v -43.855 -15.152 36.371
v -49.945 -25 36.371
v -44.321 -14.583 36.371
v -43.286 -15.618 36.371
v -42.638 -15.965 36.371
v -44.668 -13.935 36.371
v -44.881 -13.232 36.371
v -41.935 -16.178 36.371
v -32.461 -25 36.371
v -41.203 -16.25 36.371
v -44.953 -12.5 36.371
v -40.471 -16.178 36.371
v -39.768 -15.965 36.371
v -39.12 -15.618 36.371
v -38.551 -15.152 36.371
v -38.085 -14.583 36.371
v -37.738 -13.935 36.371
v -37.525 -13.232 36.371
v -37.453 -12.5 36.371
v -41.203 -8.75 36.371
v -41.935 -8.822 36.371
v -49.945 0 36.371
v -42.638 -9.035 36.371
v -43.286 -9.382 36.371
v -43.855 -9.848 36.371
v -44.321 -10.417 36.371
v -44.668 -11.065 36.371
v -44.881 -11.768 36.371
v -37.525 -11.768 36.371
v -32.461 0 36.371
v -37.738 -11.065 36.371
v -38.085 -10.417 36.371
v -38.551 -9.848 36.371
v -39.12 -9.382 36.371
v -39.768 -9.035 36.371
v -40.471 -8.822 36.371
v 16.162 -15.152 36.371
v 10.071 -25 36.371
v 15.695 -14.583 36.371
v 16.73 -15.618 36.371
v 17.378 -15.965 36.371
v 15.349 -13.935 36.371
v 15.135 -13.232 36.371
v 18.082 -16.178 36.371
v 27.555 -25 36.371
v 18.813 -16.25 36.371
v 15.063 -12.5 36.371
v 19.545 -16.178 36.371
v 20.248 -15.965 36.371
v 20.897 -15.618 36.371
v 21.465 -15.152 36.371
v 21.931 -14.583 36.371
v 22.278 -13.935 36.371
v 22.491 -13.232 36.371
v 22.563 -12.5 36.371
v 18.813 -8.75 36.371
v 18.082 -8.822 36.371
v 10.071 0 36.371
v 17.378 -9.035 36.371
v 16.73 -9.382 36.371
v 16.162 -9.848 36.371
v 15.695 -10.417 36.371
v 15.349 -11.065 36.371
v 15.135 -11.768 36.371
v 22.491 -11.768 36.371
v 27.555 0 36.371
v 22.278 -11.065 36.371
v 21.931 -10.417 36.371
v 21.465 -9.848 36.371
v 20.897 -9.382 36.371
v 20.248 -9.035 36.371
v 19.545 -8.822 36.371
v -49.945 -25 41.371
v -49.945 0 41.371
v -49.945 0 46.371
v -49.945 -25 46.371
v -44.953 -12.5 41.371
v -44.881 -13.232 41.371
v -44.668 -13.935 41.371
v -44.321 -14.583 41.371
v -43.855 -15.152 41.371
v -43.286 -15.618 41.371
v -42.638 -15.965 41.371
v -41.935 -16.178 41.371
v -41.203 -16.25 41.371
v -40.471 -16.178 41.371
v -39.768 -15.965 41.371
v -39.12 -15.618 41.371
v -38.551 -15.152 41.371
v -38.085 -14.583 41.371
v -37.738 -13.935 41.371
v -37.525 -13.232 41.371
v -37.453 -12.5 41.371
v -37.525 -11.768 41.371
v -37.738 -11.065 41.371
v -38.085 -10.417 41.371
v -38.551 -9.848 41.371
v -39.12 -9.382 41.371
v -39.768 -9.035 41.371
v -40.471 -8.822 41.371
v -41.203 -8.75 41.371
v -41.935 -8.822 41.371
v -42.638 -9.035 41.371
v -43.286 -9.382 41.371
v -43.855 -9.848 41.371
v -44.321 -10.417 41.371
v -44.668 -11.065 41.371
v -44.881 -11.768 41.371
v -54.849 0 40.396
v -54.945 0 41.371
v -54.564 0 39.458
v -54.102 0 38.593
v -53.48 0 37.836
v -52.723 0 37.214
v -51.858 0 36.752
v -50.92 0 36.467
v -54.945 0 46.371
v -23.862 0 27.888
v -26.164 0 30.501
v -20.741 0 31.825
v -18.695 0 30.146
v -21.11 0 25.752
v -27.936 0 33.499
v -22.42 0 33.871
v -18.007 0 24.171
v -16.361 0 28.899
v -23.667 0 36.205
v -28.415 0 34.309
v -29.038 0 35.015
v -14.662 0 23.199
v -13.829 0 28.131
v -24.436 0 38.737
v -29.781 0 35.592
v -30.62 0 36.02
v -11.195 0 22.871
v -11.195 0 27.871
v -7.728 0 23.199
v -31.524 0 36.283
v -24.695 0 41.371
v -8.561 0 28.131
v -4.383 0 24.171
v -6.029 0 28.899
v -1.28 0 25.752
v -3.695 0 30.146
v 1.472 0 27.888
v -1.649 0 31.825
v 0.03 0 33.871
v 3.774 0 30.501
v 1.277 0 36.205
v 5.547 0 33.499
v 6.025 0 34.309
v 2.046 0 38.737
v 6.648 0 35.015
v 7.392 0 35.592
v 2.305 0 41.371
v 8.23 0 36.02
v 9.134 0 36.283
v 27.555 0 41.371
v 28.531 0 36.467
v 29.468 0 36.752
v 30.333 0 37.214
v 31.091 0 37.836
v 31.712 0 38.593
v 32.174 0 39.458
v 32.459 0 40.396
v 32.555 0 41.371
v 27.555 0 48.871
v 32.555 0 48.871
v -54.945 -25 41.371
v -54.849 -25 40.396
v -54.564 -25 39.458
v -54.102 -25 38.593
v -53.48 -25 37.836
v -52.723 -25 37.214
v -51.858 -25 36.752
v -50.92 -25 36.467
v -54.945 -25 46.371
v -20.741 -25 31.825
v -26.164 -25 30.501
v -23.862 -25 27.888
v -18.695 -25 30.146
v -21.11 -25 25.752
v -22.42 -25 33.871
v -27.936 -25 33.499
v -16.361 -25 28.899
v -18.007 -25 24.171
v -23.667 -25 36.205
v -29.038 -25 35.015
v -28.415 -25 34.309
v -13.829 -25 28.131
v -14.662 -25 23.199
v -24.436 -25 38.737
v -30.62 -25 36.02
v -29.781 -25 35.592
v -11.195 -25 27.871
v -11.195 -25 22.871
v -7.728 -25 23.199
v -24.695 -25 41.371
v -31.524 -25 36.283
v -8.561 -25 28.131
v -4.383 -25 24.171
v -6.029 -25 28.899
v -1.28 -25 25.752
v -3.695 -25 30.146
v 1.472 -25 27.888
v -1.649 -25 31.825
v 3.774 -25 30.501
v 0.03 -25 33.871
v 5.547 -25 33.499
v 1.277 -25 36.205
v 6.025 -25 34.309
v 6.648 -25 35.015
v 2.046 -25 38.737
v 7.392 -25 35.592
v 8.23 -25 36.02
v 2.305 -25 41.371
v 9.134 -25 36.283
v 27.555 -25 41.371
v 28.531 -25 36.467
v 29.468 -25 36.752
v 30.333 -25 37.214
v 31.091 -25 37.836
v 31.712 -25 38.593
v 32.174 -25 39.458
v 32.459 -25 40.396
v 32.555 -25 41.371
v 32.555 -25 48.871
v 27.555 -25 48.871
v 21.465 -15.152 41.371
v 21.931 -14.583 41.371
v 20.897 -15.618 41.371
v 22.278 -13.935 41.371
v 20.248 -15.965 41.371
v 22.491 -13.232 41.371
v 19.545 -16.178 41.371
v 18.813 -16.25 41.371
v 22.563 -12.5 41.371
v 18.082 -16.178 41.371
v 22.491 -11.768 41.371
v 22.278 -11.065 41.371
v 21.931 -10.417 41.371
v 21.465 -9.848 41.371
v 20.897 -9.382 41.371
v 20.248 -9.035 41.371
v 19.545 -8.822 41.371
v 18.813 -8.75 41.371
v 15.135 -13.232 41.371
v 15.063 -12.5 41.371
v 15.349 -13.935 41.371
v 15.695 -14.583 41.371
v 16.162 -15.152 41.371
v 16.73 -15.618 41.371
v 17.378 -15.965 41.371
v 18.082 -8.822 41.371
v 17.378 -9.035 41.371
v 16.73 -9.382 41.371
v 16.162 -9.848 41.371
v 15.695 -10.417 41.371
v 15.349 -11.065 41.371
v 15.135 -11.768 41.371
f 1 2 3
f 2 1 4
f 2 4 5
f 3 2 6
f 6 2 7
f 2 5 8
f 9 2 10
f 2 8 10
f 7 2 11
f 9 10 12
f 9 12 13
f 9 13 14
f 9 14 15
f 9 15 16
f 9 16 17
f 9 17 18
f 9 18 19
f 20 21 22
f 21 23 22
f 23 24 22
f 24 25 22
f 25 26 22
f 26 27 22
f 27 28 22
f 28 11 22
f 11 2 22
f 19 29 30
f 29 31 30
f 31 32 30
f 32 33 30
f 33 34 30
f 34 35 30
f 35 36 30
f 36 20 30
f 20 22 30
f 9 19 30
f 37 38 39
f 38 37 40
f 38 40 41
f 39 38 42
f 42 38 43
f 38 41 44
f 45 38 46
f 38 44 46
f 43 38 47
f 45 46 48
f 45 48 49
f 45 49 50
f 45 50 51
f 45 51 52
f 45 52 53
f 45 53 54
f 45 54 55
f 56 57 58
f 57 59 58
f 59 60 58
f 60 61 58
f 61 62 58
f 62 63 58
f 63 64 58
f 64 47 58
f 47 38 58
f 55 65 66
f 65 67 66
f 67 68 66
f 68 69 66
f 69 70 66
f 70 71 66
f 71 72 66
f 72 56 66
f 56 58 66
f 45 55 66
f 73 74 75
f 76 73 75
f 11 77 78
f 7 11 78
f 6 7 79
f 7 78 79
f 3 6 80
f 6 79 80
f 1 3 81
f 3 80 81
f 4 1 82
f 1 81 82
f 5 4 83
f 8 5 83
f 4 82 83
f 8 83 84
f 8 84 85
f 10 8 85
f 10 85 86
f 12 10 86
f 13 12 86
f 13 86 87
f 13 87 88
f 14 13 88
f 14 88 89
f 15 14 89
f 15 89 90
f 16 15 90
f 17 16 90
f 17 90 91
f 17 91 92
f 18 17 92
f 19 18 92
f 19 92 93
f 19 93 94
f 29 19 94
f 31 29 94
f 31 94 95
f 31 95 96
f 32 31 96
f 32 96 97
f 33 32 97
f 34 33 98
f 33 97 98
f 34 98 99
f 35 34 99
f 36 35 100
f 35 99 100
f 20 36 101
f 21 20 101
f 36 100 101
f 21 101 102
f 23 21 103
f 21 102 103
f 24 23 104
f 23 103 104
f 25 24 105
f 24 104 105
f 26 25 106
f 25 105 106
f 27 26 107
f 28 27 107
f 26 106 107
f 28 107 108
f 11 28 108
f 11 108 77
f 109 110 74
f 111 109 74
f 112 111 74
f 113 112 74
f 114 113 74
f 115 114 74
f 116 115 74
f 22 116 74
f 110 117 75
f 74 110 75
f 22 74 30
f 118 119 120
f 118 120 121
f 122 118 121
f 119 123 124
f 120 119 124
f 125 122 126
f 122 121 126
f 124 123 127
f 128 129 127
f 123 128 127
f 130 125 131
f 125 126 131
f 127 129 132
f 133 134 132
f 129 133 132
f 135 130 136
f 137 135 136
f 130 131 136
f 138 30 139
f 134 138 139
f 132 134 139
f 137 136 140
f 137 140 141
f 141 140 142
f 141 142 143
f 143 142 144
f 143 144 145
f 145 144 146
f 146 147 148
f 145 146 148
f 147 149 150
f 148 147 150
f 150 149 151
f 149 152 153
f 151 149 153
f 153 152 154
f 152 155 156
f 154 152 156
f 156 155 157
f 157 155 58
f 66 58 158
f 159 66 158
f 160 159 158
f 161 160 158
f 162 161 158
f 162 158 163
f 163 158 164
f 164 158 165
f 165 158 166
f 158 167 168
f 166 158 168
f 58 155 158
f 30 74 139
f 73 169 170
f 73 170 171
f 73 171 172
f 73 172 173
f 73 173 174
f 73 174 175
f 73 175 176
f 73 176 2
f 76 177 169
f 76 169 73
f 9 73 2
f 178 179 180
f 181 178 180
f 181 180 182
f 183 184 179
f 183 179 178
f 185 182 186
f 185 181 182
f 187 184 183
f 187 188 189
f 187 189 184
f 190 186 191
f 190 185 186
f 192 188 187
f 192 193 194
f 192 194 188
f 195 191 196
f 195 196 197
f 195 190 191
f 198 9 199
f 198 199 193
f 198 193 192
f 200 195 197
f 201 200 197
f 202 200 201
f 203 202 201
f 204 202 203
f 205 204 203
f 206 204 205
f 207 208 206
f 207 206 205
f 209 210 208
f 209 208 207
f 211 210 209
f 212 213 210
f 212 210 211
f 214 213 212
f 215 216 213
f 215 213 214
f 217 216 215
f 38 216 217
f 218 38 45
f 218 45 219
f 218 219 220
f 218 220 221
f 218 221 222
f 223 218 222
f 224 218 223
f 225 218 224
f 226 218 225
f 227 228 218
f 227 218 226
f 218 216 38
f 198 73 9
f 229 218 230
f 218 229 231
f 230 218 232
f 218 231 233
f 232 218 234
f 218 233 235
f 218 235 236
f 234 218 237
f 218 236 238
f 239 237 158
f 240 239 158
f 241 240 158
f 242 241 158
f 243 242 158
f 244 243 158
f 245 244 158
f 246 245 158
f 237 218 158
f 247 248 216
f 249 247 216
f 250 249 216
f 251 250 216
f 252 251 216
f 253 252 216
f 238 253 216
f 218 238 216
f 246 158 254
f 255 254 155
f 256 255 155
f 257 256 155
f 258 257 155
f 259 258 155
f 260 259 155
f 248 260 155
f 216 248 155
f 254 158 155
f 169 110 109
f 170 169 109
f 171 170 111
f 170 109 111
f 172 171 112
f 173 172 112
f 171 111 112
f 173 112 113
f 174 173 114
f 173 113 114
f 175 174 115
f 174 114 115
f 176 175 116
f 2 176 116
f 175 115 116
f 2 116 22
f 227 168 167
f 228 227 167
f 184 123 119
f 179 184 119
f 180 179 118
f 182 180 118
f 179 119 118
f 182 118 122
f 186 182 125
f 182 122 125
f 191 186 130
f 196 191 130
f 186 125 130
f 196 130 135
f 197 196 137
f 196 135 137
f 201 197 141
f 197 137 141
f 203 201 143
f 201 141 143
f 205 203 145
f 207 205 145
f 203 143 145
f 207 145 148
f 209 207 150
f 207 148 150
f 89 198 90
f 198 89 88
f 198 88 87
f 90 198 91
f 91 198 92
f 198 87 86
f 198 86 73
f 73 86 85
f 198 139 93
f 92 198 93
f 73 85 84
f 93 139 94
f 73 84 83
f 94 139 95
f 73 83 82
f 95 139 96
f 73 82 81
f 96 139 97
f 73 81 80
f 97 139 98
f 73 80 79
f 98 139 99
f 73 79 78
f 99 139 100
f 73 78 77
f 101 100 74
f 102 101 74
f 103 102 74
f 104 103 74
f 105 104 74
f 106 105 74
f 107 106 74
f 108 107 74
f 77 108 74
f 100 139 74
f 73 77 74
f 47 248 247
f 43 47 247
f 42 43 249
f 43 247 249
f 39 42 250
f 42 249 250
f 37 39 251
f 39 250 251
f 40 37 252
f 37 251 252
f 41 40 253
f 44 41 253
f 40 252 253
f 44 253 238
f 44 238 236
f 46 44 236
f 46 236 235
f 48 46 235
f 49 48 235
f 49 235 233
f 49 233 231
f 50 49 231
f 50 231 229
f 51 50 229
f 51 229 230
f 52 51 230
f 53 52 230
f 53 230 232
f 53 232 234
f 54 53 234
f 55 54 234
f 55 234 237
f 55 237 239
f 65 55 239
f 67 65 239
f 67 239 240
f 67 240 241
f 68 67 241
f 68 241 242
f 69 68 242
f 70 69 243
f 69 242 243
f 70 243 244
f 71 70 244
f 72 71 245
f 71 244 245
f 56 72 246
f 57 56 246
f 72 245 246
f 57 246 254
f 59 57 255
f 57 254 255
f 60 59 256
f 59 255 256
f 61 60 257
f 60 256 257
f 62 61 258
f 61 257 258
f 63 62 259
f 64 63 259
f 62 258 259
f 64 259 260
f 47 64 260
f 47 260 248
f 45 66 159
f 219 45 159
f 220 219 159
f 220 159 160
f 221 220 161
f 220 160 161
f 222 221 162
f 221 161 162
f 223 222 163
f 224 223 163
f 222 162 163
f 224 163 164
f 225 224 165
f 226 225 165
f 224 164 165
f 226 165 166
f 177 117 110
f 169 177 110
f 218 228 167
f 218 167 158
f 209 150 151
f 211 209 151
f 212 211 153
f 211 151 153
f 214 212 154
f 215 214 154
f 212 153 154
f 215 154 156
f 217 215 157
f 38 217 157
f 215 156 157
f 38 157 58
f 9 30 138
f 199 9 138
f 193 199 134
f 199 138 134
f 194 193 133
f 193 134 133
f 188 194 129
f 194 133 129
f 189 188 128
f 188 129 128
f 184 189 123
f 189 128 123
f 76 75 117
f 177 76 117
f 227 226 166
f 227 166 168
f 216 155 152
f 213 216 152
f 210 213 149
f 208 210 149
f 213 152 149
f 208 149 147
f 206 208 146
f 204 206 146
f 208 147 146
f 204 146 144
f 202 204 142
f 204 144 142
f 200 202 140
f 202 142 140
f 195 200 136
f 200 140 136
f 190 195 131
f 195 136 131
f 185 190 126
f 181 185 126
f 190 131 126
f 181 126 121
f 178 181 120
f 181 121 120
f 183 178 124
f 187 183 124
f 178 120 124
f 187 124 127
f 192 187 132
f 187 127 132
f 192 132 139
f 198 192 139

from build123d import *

# Parameters (mm, degrees)
F1_DEPTH = 25
F3_D     = 7.5
F4_D     = 7.5


with BuildPart() as f1:
    # F0 (on Front) → F1 (new body)
    with BuildSketch(Plane.XZ):
        with BuildLine():
            Line((-49.944923, 46.371131), (-54.944923, 46.371131))
            Line((-54.944923, 46.371131), (-54.944923, 41.371131))
            ThreePointArc((-54.944923, 41.371131), (-53.480457, 37.835597), (-49.944923, 36.371131))
            Line((-49.944923, 36.371131), (-32.461094, 36.371131))
            ThreePointArc((-32.461094, 36.371131), (-29.781383, 35.592405), (-27.936377, 33.498791))
            ThreePointArc((-27.936377, 33.498791), (-11.194923, 22.871131), (5.54653, 33.498791))
            ThreePointArc((5.54653, 33.498791), (7.391536, 35.592405), (10.071247, 36.371131))
            Line((10.071247, 36.371131), (27.555077, 36.371131))
            ThreePointArc((27.555077, 36.371131), (31.09061, 37.835597), (32.555077, 41.371131))
            Line((32.555077, 41.371131), (32.555077, 48.871131))
            Line((32.555077, 48.871131), (27.555077, 48.871131))
            Line((27.555077, 48.871131), (27.555077, 41.371131))
            Line((27.555077, 41.371131), (2.305077, 41.371131))
            ThreePointArc((2.305077, 41.371131), (-11.194923, 27.871131), (-24.694923, 41.371131))
            Line((-24.694923, 41.371131), (-49.944923, 41.371131))
            Line((-49.944923, 41.371131), (-49.944923, 46.371131))
        make_face()
    extrude(amount=F1_DEPTH)

    # F3 (through all)
    with Locations(Plane(origin=(0, 0, 36.371131), x_dir=(1, 0, 0), z_dir=(0, 0, -1))):
        with Locations((-41.203009, 12.5)):
            Hole(F3_D / 2)

    # F4 (through all)
    with Locations(Plane(origin=(0, 0, 36.371131), x_dir=(1, 0, 0), z_dir=(0, 0, -1))):
        with Locations((18.813162, 12.5)):
            Hole(F4_D / 2)


solid = f1.part
